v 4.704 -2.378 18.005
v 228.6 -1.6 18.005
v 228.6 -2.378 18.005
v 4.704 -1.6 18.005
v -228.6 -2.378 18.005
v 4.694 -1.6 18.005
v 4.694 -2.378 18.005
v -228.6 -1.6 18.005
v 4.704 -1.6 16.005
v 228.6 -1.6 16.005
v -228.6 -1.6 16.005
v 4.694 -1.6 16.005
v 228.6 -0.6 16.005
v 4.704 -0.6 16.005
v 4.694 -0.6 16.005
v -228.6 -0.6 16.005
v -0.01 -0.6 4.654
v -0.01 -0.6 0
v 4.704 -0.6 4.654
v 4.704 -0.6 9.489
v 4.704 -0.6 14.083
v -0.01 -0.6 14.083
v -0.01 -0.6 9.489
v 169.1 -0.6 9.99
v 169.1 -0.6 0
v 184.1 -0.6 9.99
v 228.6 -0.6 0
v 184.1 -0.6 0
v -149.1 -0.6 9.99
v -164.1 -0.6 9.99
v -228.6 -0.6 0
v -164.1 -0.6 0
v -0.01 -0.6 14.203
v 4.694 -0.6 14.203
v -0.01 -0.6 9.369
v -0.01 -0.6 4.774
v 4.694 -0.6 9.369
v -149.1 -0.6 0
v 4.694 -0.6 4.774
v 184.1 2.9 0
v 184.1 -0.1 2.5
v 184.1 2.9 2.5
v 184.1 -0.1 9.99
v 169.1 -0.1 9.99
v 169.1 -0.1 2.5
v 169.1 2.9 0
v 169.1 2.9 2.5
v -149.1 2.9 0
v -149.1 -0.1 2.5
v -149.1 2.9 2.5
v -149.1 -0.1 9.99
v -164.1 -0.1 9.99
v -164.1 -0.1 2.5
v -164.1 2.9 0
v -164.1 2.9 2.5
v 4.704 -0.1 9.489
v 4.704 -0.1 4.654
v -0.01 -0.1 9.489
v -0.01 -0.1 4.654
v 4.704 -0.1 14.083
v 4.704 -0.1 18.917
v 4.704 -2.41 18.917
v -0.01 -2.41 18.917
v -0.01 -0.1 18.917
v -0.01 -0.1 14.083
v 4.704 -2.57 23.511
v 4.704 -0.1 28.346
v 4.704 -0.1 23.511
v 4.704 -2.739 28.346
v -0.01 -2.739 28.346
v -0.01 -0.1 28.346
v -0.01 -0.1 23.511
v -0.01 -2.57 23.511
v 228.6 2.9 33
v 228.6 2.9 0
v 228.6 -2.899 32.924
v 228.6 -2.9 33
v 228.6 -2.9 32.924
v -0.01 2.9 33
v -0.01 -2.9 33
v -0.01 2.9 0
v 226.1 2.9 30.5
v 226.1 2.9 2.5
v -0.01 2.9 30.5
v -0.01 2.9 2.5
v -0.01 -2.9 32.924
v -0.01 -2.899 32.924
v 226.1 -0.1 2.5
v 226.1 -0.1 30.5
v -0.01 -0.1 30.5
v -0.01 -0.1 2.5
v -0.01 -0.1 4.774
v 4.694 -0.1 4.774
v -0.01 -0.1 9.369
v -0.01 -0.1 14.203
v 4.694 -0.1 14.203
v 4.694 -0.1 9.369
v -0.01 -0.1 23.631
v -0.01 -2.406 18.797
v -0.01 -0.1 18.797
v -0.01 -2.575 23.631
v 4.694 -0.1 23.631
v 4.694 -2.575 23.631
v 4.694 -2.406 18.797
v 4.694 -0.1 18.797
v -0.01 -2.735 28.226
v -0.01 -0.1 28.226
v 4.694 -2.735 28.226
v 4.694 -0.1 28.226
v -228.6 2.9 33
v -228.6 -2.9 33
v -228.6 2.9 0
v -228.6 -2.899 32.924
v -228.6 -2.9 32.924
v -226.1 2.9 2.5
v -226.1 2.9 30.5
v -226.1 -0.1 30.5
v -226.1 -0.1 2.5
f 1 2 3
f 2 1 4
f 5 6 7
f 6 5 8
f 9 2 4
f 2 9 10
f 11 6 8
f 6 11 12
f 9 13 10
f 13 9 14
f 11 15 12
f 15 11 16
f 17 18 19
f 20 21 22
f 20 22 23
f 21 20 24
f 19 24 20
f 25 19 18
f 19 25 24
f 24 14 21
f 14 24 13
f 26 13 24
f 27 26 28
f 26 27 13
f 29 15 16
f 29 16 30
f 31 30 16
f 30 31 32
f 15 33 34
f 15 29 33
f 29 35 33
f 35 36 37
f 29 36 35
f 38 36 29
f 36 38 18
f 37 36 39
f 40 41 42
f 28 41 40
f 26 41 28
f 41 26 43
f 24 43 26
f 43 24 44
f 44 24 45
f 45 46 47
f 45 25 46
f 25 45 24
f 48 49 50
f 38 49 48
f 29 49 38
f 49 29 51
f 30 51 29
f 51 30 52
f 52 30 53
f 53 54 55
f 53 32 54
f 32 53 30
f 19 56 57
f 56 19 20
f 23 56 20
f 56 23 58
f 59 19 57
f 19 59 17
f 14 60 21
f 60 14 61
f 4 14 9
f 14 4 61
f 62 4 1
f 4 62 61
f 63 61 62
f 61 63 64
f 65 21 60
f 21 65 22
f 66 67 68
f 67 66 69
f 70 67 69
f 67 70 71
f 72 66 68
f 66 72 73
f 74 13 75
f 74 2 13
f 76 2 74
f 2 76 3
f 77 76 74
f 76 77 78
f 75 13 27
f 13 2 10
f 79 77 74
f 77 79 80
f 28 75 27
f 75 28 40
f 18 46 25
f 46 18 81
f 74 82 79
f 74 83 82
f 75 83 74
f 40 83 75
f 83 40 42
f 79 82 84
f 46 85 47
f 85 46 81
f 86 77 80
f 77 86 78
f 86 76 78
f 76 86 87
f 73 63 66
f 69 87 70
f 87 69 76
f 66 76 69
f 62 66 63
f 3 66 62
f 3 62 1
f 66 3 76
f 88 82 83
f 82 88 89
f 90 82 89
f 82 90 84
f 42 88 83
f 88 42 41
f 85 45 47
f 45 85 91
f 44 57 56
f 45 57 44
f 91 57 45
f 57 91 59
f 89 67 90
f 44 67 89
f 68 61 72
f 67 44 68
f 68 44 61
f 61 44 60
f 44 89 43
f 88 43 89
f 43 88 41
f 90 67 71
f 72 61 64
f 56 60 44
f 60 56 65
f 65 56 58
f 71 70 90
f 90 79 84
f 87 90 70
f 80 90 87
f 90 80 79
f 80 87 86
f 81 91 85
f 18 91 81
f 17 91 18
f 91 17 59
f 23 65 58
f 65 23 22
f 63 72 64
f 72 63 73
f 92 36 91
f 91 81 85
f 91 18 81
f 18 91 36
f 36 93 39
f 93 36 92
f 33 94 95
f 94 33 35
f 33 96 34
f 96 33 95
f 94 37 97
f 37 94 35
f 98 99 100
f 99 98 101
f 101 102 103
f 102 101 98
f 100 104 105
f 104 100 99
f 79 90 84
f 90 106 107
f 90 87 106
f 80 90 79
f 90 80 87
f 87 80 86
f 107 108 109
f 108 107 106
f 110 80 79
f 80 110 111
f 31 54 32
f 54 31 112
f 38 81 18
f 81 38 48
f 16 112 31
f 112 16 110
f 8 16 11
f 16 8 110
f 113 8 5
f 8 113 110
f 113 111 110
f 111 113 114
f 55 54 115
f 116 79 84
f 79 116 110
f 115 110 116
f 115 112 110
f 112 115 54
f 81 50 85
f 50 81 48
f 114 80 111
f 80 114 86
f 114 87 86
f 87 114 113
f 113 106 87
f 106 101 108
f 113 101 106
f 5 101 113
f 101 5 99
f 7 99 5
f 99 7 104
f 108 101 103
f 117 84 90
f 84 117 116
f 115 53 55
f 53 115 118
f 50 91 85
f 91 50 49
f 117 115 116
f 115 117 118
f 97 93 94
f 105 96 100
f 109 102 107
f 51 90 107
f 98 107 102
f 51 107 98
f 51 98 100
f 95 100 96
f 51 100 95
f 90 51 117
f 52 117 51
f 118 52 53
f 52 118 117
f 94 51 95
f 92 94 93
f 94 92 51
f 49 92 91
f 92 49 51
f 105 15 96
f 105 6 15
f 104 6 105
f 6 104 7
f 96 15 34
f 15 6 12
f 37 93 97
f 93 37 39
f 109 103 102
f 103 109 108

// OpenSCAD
// Cosmetic cover for my automatic door
length = 18*25.4;
height = 33;
thick = 5.8;
eps = 0.01;
num_cuts = 7;
rlb = 2; // 0=right, 1=left, 2=both
flip = 0; // I print flipped so the thicker base at bottom

rotate([0, 180*flip, 0]) {
  if (rlb == 2) {
    Piece(true);
    Piece(false);
  } else {
    Piece(rlb ? true: false);
  }
}

module Piece(left) {
  difference() {
    translate([0, 0, height/2])
      cube([length, thick, height], center=true);
    Taper();
    BottomBlock();
    CutoutBack();
    CutoutForBolts();
    Sawtooth(num_cuts, height, thick, left);
    CutRest(num_cuts, height, thick, left);
  }
}

module Taper() {
  ang = 90-88;
  offset = (height)*sin(ang);
  rotate([ang, 0, 0])
    translate([0, -thick+offset, height/2])
      cube([length+eps, thick, height+eps], center=true);
}

module BottomBlock() {
  bb_height = 15;
  bottom_taper = 1.3;
  lip = 2;
  translate([0, -thick+bottom_taper, height/2-bb_height])
    cube([length+eps, thick, height+eps], center=true);
  translate([0, -thick+bottom_taper+1, height/2-bb_height-lip])
    cube([length+eps, thick, height+eps], center=true);
}

module CutoutBack() {
  edge = 5;
  depth = 6;
  translate([0, thick/2, height/2])
    cube([length-edge, depth, height-edge], center=true);
}

module Sawtooth(num, total_height, thickness, reverse) {
  inset = total_height / num;
  bottom = -total_height/2 + inset/2;
  play = 0.1;
  flip = reverse ? inset: 0;
  tonum = reverse ? num-2 : num-1;
  rotate([0, 0, 0])
    translate([inset/2 - eps, 0, flip+total_height/2])
      rotate([90, 0, 0])
        for (y = [0: 2: tonum]) {
          translate([0, bottom + inset * y, 0])
            cube([inset, inset+2*eps+play, thickness+2*eps], center=true);
        }
}

module CutRest(num, total_height, thick, reverse) {
  inset = total_height/num;
  offset = reverse ? -length/4-eps: length/4+inset-2*eps;
  translate([offset, 0, height/2])
      cube([length/2, thick+2*eps, height+8*eps], center=true);
}

module CutoutForBolts() {
  from_edge_r = 52; // to center of bolt
  from_edge_l = 57;

  Bolt(1, from_edge_r);
  Bolt(-1, from_edge_l);
}

module Bolt(dir, from_edge) {
  bolt_width = 15; // really 11mm + some extra
  bolt_height = 10;

  translate([dir*(length/2-bolt_width/2-from_edge), -thick/4, -eps])
    cube([bolt_width, thick+eps, bolt_height]);
}
